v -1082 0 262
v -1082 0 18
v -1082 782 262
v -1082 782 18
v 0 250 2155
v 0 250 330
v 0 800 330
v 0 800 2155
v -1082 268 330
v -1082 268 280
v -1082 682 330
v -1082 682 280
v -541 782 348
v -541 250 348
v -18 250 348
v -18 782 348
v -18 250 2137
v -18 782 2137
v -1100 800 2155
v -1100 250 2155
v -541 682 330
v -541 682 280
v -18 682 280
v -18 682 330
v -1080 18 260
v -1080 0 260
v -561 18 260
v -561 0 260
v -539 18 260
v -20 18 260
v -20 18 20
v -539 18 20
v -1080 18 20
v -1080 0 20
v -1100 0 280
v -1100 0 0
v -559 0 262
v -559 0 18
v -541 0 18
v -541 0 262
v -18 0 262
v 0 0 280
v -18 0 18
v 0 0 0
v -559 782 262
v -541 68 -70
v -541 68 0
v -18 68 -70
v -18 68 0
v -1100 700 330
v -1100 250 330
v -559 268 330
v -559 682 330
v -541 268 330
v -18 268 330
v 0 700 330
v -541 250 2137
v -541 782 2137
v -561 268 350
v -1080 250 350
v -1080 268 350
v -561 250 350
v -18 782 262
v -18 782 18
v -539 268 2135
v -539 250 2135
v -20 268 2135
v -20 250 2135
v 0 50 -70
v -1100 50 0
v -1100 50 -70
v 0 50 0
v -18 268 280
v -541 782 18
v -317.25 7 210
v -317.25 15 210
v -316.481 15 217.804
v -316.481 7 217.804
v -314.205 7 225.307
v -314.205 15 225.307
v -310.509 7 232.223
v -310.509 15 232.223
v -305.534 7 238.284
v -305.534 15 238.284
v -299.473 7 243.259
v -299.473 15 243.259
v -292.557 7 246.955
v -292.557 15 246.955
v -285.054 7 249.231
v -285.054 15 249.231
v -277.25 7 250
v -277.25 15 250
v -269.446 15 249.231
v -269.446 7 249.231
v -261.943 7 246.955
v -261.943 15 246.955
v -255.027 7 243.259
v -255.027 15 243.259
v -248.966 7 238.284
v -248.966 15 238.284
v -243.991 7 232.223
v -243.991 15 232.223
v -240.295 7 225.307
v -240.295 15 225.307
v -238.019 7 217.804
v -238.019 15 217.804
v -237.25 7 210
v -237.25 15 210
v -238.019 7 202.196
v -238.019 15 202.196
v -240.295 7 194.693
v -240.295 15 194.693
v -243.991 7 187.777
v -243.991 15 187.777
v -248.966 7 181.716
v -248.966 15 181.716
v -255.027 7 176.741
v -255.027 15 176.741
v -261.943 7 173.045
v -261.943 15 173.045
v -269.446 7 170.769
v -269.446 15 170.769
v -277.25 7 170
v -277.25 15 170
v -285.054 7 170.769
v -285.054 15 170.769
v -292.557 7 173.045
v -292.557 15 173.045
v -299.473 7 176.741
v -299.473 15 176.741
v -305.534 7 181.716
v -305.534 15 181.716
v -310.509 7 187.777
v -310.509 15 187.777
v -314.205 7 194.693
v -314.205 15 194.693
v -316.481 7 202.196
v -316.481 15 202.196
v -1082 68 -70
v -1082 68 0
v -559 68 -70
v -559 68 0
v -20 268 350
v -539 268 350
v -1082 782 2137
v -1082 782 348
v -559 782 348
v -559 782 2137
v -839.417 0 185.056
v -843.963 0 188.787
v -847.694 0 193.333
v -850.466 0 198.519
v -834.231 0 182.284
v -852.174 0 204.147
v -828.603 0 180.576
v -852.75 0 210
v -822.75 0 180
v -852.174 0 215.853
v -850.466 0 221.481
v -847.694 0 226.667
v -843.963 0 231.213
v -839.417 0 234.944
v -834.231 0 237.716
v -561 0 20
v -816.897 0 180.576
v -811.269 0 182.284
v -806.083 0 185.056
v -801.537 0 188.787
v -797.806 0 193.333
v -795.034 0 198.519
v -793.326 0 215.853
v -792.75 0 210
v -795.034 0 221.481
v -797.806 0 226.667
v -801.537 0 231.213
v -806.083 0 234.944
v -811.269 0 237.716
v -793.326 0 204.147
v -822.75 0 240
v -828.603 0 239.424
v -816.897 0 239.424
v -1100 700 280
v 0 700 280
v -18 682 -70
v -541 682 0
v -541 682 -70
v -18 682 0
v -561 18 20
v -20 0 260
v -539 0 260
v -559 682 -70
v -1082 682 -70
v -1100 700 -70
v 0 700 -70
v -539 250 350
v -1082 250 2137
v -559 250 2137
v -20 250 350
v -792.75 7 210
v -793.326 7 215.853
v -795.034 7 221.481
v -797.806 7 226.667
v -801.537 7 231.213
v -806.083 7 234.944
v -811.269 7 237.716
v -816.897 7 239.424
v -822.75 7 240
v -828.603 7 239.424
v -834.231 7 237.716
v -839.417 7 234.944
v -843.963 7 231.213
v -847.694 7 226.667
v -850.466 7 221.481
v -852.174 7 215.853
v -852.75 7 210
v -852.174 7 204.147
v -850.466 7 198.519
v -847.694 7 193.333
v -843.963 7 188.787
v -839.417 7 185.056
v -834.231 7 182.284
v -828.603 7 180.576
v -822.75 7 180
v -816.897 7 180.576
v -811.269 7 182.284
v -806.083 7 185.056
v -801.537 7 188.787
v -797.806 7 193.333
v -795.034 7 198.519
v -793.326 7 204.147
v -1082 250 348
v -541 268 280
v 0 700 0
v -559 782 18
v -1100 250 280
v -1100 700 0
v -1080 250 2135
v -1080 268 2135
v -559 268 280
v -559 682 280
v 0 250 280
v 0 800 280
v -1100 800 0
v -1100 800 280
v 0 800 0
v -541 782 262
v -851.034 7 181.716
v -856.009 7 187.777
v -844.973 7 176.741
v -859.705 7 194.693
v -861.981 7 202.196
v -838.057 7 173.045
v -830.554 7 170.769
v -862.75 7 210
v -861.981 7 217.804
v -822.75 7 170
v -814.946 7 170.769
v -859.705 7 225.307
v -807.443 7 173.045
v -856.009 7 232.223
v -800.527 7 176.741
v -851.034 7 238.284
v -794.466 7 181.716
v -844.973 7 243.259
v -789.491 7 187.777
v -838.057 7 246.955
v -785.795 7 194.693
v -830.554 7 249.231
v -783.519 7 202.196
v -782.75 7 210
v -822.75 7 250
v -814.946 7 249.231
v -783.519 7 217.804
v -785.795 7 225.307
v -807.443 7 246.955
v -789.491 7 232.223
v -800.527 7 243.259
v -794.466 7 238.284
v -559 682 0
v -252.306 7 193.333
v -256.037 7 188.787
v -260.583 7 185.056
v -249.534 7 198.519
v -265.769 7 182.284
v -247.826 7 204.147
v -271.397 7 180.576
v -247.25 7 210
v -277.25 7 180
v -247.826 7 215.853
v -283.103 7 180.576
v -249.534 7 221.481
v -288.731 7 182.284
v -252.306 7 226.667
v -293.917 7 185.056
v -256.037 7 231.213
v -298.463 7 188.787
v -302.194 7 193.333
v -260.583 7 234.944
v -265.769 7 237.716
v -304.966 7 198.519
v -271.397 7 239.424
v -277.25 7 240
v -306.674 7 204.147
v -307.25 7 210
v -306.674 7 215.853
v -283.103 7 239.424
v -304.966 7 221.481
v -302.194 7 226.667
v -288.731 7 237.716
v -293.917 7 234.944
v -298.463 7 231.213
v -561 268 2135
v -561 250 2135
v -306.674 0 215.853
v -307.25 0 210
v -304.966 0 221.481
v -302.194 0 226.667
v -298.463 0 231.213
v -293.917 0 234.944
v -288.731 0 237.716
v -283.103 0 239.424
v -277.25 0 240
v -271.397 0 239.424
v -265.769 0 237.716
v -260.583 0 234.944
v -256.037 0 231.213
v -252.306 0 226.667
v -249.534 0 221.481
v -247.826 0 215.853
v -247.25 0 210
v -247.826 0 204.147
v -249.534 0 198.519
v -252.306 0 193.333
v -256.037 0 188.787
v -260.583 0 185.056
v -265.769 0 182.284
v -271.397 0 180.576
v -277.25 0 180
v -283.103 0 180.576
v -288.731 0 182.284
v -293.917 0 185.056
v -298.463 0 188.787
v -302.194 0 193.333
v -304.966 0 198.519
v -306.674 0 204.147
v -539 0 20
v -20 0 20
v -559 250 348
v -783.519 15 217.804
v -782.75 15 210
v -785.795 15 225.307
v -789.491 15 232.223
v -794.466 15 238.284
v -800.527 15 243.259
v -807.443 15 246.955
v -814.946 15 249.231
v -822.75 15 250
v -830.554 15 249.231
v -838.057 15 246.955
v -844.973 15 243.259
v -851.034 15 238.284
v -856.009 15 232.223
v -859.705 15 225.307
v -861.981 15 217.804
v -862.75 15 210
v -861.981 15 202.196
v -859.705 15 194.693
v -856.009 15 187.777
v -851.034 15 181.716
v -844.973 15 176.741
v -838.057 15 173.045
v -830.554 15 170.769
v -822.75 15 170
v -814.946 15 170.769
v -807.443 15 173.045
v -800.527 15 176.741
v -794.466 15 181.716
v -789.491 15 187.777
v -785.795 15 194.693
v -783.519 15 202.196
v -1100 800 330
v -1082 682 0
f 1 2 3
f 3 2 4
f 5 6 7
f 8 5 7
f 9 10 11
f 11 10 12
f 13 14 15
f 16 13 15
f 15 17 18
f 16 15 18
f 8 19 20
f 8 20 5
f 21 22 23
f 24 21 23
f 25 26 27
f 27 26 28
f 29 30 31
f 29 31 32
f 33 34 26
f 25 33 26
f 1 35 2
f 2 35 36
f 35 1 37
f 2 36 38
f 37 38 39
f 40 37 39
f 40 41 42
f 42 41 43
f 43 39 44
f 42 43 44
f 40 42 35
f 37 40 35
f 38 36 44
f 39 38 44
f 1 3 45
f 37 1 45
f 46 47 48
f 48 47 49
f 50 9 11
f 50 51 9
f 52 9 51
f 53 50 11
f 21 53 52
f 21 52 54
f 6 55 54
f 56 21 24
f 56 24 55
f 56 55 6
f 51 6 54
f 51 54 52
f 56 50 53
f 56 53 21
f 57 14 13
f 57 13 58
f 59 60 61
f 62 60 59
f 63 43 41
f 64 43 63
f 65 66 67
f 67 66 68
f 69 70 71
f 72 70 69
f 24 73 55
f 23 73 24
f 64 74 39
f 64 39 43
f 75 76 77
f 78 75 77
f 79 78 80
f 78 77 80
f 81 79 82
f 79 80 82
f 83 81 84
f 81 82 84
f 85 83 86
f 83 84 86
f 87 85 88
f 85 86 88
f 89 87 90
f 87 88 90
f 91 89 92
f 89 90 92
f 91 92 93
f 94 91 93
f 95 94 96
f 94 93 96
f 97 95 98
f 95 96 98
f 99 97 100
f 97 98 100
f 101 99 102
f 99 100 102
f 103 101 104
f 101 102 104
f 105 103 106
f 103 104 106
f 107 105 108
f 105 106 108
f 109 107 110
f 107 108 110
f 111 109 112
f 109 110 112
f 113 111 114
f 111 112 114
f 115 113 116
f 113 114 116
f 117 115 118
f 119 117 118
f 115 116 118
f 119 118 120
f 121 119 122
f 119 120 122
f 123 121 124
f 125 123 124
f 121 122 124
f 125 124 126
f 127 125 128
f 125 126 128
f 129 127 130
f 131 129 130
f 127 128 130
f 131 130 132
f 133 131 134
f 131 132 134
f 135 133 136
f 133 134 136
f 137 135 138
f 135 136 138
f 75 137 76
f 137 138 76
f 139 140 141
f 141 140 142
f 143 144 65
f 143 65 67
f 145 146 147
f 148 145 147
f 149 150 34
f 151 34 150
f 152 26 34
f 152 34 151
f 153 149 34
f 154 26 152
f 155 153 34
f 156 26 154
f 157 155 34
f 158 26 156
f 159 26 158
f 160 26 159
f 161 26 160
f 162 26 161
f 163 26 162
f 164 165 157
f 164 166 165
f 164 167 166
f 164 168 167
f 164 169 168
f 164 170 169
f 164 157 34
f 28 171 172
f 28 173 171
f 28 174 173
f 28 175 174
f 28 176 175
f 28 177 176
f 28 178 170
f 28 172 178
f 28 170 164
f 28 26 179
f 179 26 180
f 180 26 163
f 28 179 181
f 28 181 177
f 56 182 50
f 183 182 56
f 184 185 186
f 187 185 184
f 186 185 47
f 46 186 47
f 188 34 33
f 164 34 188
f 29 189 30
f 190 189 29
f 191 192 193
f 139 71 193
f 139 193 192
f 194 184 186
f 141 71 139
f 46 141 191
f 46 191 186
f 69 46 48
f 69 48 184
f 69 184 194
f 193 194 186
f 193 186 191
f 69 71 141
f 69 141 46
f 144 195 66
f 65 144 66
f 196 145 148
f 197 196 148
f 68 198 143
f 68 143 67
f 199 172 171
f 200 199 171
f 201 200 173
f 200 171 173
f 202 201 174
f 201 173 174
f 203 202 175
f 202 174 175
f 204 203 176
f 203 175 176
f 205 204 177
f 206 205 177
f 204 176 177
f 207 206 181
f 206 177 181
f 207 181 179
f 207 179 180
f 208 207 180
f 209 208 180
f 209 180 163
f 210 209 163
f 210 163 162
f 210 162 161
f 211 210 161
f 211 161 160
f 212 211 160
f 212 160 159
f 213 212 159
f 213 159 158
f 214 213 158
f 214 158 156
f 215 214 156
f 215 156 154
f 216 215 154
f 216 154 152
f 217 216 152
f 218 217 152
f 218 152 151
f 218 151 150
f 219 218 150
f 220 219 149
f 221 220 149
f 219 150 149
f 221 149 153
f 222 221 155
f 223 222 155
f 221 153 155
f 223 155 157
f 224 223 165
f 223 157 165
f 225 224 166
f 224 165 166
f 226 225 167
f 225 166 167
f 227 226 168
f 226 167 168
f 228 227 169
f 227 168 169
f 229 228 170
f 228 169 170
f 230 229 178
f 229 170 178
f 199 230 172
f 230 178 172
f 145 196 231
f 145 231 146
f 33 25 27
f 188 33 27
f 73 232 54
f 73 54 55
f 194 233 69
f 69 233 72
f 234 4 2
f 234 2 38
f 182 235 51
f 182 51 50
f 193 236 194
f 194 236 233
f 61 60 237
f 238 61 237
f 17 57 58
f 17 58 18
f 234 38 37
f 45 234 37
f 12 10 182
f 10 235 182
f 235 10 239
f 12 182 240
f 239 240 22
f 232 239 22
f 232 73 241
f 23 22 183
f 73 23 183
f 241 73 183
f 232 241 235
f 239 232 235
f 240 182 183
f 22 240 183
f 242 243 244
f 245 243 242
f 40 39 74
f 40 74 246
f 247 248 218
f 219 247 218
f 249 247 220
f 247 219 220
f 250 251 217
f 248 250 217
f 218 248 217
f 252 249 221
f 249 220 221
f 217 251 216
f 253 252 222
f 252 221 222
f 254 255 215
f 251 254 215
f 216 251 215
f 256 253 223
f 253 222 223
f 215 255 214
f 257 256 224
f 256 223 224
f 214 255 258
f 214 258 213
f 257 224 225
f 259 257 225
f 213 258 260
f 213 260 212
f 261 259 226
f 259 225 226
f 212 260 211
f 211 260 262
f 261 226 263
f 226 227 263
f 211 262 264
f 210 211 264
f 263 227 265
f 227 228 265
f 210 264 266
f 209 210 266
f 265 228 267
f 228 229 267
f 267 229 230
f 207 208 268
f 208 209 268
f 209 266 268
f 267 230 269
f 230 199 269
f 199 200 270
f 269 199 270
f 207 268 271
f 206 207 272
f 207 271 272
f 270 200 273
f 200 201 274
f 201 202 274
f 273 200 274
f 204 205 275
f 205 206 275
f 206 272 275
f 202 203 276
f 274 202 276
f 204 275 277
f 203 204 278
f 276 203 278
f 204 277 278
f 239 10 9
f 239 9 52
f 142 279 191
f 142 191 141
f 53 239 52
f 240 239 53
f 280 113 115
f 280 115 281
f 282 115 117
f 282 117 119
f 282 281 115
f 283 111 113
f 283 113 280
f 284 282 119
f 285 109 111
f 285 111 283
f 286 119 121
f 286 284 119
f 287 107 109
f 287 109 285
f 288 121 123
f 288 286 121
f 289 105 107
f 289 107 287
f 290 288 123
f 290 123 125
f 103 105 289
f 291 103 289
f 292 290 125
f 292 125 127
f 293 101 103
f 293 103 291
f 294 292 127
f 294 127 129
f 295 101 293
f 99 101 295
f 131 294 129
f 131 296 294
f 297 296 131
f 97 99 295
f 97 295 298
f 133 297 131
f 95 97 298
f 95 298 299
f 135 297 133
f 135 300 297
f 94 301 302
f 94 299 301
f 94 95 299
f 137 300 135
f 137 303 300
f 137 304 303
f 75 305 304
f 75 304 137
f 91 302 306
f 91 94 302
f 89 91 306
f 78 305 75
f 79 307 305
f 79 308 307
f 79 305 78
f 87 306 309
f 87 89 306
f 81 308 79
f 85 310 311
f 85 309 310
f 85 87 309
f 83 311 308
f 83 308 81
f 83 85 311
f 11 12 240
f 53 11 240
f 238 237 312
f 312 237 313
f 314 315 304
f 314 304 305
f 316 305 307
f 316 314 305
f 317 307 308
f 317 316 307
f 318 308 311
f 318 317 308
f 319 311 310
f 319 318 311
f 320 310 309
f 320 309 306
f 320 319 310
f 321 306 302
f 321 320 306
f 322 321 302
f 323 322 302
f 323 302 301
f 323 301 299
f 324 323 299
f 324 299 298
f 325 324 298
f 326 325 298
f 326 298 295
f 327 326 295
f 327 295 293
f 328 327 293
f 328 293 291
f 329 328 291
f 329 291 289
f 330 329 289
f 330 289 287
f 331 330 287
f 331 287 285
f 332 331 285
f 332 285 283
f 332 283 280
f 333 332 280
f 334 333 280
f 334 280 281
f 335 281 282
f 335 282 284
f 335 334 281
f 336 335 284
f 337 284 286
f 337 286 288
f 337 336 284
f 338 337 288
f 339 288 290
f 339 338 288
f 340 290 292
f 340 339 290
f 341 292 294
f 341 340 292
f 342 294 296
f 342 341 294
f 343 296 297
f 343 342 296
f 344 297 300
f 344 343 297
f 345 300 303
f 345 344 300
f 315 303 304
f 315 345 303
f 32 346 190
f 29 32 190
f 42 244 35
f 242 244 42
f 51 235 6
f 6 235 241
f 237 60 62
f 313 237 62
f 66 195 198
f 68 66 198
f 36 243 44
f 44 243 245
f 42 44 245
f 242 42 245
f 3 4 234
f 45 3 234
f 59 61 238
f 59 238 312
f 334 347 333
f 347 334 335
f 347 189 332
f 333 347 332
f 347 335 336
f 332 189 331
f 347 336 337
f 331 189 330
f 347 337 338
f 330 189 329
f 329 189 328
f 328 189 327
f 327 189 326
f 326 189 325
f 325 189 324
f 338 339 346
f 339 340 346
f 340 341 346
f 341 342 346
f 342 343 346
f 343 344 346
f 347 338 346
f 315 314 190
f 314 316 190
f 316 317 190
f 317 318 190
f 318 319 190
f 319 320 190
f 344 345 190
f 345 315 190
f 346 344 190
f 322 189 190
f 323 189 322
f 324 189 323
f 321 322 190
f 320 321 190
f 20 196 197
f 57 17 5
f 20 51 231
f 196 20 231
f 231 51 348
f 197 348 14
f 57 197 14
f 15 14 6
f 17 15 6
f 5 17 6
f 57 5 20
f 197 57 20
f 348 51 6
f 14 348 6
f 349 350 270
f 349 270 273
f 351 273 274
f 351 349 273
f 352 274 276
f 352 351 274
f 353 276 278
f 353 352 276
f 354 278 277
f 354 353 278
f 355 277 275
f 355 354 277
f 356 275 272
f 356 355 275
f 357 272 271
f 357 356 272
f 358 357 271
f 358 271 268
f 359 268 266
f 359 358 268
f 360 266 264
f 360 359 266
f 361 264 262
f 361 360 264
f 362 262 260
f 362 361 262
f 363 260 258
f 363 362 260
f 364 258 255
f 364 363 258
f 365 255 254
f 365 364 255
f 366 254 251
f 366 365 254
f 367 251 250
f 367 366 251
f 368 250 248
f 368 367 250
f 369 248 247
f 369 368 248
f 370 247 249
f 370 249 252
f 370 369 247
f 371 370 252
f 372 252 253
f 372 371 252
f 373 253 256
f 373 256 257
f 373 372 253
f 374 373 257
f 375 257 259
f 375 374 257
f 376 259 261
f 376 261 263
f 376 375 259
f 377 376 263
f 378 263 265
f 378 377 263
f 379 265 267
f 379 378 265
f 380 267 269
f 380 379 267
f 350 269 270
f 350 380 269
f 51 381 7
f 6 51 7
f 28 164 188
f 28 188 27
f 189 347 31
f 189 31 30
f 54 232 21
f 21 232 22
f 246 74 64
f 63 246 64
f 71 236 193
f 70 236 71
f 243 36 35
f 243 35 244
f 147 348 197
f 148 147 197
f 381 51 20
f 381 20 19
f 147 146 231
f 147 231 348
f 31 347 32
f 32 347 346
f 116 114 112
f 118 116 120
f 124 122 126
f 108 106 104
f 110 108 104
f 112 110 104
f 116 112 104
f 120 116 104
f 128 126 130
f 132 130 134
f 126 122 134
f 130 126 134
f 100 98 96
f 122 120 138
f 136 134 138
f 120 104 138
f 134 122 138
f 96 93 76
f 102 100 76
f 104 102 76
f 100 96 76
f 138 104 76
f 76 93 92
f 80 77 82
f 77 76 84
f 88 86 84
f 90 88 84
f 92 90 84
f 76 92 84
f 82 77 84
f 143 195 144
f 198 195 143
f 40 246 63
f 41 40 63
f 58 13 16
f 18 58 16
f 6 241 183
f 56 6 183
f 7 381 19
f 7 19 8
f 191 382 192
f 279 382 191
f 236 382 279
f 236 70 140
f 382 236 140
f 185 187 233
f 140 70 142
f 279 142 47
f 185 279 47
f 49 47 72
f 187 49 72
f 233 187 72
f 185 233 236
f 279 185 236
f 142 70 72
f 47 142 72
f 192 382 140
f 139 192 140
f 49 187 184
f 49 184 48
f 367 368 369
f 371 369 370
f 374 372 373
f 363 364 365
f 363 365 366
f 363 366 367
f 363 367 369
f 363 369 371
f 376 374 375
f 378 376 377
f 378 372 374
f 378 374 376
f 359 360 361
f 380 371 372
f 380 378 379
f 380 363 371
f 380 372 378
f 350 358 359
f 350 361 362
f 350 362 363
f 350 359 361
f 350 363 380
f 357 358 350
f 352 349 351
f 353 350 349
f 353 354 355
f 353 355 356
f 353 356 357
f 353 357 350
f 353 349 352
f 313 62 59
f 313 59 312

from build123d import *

# Parameters (mm, degrees)
F0_W      = 1100
F0_H      = 800
F1_DEPTH  = 280
F2_T      = -18
F3_W      = 18
F3_H      = 244
F4_DEPTH  = 782
F5_W      = 519
F5_H      = 240
F6_DEPTH  = 18
F8_R      = 30
F9_DEPTH  = 15
F10_R     = 40
F11_DEPTH = 8
F13_W     = 1100
F13_H     = 650
F13_W_2   = 523
F13_H_2   = 614
F14_DEPTH = 70
F15_W     = 1100
F15_H     = 450
F15_W_2   = 523
F15_H_2   = 414
F16_DEPTH = 50
F17_W     = 1100
F17_H     = 550
F18_DEPTH = 1825
F19_T     = -18
F20_W     = 18
F20_H     = 1789
F21_DEPTH = 532
F22_W     = 519
F22_H     = 1785
F23_DEPTH = 18


with BuildPart() as f1:
    # F0 (on Top) → F1 (new body)
    with BuildSketch(Plane.XY):
        with Locations((-550, 400)):
            Rectangle(F0_W, F0_H)
    extrude(amount=F1_DEPTH)

    # F2
    f2_openings = [f1.faces().sort_by_distance(p)[0] for p in [
        (-550, 0, 140),
    ]]
    offset(amount=F2_T, openings=f2_openings)

    # F3 (on face) → F4 (join, through all)
    with BuildSketch(Plane.XZ):
        with Locations((-550, 140)):
            Rectangle(F3_W, F3_H)
    extrude(amount=-F4_DEPTH)


with BuildPart() as f6:
    # F5 (on face) → F6 (new body)
    with BuildSketch(Plane.XZ):
        with Locations((-820.5, 140)):
            Rectangle(F5_W, F5_H)
    extrude(amount=-F6_DEPTH)

    # F8 (on face) → F9 (cut)
    with BuildSketch(Plane.XZ):
        with Locations((-822.75, 210)):
            Circle(F8_R)
    extrude(amount=-F9_DEPTH, mode=Mode.SUBTRACT)

    # F10 (on face) → F11 (cut)
    with BuildSketch(Plane.XZ.offset(-15)):
        with Locations((-822.75, 210)):
            Circle(F10_R)
    extrude(amount=F11_DEPTH, mode=Mode.SUBTRACT)


with BuildPart() as f12_1:
    # F12: instance of F6
    add(f6.part.mirror(Plane(origin=(-550, 400, 140), x_dir=(0, 1, 0), z_dir=(1, 0, 0))))


with BuildPart() as f14:
    # F13 (on face) → F14 (new body)
    with BuildSketch(Plane(origin=(0, 0, 0), x_dir=(1, 0, 0), z_dir=(0, 0, -1))):
        with Locations((-550, -375)):
            Rectangle(F13_W, F13_H)
        with Locations((-820.5, -375)):
            Rectangle(F13_W_2, F13_H_2, mode=Mode.SUBTRACT)
        with Locations((-279.5, -375)):
            Rectangle(F13_W_2, F13_H_2, mode=Mode.SUBTRACT)
    extrude(amount=F14_DEPTH)


with BuildPart() as f16:
    # F15 (on face) → F16 (new body)
    with BuildSketch(Plane.XY.offset(280)):
        with Locations((-550, 475)):
            Rectangle(F15_W, F15_H)
        with Locations((-820.5, 475)):
            Rectangle(F15_W_2, F15_H_2, mode=Mode.SUBTRACT)
        with Locations((-279.5, 475)):
            Rectangle(F15_W_2, F15_H_2, mode=Mode.SUBTRACT)
    extrude(amount=F16_DEPTH)


with BuildPart() as f18:
    # F17 (on face) → F18 (new body)
    with BuildSketch(Plane.XY.offset(330)):
        with Locations((-550, 525)):
            Rectangle(F17_W, F17_H)
    extrude(amount=F18_DEPTH)

    # F19
    f19_openings = [f18.faces().sort_by_distance(p)[0] for p in [
        (-550, 250, 1242.5),
    ]]
    offset(amount=F19_T, openings=f19_openings)

    # F20 (on face) → F21 (join, through all)
    with BuildSketch(Plane.XZ.offset(-250)):
        with Locations((-550, 1242.5)):
            Rectangle(F20_W, F20_H)
    extrude(amount=-F21_DEPTH)


with BuildPart() as f23:
    # F22 (on face) → F23 (new body)
    with BuildSketch(Plane.XZ.offset(-250)):
        with Locations((-820.5, 1242.5)):
            Rectangle(F22_W, F22_H)
    extrude(amount=-F23_DEPTH)


with BuildPart() as f23b:
    # F22 (on face) → F23, piece 2 (new body)
    with BuildSketch(Plane.XZ.offset(-250)):
        with Locations((-279.5, 1242.5)):
            Rectangle(F22_W, F22_H)
    extrude(amount=-F23_DEPTH)


solid = Compound([f1.part, f6.part, f12_1.part, f14.part, f16.part, f18.part, f23.part, f23b.part])
